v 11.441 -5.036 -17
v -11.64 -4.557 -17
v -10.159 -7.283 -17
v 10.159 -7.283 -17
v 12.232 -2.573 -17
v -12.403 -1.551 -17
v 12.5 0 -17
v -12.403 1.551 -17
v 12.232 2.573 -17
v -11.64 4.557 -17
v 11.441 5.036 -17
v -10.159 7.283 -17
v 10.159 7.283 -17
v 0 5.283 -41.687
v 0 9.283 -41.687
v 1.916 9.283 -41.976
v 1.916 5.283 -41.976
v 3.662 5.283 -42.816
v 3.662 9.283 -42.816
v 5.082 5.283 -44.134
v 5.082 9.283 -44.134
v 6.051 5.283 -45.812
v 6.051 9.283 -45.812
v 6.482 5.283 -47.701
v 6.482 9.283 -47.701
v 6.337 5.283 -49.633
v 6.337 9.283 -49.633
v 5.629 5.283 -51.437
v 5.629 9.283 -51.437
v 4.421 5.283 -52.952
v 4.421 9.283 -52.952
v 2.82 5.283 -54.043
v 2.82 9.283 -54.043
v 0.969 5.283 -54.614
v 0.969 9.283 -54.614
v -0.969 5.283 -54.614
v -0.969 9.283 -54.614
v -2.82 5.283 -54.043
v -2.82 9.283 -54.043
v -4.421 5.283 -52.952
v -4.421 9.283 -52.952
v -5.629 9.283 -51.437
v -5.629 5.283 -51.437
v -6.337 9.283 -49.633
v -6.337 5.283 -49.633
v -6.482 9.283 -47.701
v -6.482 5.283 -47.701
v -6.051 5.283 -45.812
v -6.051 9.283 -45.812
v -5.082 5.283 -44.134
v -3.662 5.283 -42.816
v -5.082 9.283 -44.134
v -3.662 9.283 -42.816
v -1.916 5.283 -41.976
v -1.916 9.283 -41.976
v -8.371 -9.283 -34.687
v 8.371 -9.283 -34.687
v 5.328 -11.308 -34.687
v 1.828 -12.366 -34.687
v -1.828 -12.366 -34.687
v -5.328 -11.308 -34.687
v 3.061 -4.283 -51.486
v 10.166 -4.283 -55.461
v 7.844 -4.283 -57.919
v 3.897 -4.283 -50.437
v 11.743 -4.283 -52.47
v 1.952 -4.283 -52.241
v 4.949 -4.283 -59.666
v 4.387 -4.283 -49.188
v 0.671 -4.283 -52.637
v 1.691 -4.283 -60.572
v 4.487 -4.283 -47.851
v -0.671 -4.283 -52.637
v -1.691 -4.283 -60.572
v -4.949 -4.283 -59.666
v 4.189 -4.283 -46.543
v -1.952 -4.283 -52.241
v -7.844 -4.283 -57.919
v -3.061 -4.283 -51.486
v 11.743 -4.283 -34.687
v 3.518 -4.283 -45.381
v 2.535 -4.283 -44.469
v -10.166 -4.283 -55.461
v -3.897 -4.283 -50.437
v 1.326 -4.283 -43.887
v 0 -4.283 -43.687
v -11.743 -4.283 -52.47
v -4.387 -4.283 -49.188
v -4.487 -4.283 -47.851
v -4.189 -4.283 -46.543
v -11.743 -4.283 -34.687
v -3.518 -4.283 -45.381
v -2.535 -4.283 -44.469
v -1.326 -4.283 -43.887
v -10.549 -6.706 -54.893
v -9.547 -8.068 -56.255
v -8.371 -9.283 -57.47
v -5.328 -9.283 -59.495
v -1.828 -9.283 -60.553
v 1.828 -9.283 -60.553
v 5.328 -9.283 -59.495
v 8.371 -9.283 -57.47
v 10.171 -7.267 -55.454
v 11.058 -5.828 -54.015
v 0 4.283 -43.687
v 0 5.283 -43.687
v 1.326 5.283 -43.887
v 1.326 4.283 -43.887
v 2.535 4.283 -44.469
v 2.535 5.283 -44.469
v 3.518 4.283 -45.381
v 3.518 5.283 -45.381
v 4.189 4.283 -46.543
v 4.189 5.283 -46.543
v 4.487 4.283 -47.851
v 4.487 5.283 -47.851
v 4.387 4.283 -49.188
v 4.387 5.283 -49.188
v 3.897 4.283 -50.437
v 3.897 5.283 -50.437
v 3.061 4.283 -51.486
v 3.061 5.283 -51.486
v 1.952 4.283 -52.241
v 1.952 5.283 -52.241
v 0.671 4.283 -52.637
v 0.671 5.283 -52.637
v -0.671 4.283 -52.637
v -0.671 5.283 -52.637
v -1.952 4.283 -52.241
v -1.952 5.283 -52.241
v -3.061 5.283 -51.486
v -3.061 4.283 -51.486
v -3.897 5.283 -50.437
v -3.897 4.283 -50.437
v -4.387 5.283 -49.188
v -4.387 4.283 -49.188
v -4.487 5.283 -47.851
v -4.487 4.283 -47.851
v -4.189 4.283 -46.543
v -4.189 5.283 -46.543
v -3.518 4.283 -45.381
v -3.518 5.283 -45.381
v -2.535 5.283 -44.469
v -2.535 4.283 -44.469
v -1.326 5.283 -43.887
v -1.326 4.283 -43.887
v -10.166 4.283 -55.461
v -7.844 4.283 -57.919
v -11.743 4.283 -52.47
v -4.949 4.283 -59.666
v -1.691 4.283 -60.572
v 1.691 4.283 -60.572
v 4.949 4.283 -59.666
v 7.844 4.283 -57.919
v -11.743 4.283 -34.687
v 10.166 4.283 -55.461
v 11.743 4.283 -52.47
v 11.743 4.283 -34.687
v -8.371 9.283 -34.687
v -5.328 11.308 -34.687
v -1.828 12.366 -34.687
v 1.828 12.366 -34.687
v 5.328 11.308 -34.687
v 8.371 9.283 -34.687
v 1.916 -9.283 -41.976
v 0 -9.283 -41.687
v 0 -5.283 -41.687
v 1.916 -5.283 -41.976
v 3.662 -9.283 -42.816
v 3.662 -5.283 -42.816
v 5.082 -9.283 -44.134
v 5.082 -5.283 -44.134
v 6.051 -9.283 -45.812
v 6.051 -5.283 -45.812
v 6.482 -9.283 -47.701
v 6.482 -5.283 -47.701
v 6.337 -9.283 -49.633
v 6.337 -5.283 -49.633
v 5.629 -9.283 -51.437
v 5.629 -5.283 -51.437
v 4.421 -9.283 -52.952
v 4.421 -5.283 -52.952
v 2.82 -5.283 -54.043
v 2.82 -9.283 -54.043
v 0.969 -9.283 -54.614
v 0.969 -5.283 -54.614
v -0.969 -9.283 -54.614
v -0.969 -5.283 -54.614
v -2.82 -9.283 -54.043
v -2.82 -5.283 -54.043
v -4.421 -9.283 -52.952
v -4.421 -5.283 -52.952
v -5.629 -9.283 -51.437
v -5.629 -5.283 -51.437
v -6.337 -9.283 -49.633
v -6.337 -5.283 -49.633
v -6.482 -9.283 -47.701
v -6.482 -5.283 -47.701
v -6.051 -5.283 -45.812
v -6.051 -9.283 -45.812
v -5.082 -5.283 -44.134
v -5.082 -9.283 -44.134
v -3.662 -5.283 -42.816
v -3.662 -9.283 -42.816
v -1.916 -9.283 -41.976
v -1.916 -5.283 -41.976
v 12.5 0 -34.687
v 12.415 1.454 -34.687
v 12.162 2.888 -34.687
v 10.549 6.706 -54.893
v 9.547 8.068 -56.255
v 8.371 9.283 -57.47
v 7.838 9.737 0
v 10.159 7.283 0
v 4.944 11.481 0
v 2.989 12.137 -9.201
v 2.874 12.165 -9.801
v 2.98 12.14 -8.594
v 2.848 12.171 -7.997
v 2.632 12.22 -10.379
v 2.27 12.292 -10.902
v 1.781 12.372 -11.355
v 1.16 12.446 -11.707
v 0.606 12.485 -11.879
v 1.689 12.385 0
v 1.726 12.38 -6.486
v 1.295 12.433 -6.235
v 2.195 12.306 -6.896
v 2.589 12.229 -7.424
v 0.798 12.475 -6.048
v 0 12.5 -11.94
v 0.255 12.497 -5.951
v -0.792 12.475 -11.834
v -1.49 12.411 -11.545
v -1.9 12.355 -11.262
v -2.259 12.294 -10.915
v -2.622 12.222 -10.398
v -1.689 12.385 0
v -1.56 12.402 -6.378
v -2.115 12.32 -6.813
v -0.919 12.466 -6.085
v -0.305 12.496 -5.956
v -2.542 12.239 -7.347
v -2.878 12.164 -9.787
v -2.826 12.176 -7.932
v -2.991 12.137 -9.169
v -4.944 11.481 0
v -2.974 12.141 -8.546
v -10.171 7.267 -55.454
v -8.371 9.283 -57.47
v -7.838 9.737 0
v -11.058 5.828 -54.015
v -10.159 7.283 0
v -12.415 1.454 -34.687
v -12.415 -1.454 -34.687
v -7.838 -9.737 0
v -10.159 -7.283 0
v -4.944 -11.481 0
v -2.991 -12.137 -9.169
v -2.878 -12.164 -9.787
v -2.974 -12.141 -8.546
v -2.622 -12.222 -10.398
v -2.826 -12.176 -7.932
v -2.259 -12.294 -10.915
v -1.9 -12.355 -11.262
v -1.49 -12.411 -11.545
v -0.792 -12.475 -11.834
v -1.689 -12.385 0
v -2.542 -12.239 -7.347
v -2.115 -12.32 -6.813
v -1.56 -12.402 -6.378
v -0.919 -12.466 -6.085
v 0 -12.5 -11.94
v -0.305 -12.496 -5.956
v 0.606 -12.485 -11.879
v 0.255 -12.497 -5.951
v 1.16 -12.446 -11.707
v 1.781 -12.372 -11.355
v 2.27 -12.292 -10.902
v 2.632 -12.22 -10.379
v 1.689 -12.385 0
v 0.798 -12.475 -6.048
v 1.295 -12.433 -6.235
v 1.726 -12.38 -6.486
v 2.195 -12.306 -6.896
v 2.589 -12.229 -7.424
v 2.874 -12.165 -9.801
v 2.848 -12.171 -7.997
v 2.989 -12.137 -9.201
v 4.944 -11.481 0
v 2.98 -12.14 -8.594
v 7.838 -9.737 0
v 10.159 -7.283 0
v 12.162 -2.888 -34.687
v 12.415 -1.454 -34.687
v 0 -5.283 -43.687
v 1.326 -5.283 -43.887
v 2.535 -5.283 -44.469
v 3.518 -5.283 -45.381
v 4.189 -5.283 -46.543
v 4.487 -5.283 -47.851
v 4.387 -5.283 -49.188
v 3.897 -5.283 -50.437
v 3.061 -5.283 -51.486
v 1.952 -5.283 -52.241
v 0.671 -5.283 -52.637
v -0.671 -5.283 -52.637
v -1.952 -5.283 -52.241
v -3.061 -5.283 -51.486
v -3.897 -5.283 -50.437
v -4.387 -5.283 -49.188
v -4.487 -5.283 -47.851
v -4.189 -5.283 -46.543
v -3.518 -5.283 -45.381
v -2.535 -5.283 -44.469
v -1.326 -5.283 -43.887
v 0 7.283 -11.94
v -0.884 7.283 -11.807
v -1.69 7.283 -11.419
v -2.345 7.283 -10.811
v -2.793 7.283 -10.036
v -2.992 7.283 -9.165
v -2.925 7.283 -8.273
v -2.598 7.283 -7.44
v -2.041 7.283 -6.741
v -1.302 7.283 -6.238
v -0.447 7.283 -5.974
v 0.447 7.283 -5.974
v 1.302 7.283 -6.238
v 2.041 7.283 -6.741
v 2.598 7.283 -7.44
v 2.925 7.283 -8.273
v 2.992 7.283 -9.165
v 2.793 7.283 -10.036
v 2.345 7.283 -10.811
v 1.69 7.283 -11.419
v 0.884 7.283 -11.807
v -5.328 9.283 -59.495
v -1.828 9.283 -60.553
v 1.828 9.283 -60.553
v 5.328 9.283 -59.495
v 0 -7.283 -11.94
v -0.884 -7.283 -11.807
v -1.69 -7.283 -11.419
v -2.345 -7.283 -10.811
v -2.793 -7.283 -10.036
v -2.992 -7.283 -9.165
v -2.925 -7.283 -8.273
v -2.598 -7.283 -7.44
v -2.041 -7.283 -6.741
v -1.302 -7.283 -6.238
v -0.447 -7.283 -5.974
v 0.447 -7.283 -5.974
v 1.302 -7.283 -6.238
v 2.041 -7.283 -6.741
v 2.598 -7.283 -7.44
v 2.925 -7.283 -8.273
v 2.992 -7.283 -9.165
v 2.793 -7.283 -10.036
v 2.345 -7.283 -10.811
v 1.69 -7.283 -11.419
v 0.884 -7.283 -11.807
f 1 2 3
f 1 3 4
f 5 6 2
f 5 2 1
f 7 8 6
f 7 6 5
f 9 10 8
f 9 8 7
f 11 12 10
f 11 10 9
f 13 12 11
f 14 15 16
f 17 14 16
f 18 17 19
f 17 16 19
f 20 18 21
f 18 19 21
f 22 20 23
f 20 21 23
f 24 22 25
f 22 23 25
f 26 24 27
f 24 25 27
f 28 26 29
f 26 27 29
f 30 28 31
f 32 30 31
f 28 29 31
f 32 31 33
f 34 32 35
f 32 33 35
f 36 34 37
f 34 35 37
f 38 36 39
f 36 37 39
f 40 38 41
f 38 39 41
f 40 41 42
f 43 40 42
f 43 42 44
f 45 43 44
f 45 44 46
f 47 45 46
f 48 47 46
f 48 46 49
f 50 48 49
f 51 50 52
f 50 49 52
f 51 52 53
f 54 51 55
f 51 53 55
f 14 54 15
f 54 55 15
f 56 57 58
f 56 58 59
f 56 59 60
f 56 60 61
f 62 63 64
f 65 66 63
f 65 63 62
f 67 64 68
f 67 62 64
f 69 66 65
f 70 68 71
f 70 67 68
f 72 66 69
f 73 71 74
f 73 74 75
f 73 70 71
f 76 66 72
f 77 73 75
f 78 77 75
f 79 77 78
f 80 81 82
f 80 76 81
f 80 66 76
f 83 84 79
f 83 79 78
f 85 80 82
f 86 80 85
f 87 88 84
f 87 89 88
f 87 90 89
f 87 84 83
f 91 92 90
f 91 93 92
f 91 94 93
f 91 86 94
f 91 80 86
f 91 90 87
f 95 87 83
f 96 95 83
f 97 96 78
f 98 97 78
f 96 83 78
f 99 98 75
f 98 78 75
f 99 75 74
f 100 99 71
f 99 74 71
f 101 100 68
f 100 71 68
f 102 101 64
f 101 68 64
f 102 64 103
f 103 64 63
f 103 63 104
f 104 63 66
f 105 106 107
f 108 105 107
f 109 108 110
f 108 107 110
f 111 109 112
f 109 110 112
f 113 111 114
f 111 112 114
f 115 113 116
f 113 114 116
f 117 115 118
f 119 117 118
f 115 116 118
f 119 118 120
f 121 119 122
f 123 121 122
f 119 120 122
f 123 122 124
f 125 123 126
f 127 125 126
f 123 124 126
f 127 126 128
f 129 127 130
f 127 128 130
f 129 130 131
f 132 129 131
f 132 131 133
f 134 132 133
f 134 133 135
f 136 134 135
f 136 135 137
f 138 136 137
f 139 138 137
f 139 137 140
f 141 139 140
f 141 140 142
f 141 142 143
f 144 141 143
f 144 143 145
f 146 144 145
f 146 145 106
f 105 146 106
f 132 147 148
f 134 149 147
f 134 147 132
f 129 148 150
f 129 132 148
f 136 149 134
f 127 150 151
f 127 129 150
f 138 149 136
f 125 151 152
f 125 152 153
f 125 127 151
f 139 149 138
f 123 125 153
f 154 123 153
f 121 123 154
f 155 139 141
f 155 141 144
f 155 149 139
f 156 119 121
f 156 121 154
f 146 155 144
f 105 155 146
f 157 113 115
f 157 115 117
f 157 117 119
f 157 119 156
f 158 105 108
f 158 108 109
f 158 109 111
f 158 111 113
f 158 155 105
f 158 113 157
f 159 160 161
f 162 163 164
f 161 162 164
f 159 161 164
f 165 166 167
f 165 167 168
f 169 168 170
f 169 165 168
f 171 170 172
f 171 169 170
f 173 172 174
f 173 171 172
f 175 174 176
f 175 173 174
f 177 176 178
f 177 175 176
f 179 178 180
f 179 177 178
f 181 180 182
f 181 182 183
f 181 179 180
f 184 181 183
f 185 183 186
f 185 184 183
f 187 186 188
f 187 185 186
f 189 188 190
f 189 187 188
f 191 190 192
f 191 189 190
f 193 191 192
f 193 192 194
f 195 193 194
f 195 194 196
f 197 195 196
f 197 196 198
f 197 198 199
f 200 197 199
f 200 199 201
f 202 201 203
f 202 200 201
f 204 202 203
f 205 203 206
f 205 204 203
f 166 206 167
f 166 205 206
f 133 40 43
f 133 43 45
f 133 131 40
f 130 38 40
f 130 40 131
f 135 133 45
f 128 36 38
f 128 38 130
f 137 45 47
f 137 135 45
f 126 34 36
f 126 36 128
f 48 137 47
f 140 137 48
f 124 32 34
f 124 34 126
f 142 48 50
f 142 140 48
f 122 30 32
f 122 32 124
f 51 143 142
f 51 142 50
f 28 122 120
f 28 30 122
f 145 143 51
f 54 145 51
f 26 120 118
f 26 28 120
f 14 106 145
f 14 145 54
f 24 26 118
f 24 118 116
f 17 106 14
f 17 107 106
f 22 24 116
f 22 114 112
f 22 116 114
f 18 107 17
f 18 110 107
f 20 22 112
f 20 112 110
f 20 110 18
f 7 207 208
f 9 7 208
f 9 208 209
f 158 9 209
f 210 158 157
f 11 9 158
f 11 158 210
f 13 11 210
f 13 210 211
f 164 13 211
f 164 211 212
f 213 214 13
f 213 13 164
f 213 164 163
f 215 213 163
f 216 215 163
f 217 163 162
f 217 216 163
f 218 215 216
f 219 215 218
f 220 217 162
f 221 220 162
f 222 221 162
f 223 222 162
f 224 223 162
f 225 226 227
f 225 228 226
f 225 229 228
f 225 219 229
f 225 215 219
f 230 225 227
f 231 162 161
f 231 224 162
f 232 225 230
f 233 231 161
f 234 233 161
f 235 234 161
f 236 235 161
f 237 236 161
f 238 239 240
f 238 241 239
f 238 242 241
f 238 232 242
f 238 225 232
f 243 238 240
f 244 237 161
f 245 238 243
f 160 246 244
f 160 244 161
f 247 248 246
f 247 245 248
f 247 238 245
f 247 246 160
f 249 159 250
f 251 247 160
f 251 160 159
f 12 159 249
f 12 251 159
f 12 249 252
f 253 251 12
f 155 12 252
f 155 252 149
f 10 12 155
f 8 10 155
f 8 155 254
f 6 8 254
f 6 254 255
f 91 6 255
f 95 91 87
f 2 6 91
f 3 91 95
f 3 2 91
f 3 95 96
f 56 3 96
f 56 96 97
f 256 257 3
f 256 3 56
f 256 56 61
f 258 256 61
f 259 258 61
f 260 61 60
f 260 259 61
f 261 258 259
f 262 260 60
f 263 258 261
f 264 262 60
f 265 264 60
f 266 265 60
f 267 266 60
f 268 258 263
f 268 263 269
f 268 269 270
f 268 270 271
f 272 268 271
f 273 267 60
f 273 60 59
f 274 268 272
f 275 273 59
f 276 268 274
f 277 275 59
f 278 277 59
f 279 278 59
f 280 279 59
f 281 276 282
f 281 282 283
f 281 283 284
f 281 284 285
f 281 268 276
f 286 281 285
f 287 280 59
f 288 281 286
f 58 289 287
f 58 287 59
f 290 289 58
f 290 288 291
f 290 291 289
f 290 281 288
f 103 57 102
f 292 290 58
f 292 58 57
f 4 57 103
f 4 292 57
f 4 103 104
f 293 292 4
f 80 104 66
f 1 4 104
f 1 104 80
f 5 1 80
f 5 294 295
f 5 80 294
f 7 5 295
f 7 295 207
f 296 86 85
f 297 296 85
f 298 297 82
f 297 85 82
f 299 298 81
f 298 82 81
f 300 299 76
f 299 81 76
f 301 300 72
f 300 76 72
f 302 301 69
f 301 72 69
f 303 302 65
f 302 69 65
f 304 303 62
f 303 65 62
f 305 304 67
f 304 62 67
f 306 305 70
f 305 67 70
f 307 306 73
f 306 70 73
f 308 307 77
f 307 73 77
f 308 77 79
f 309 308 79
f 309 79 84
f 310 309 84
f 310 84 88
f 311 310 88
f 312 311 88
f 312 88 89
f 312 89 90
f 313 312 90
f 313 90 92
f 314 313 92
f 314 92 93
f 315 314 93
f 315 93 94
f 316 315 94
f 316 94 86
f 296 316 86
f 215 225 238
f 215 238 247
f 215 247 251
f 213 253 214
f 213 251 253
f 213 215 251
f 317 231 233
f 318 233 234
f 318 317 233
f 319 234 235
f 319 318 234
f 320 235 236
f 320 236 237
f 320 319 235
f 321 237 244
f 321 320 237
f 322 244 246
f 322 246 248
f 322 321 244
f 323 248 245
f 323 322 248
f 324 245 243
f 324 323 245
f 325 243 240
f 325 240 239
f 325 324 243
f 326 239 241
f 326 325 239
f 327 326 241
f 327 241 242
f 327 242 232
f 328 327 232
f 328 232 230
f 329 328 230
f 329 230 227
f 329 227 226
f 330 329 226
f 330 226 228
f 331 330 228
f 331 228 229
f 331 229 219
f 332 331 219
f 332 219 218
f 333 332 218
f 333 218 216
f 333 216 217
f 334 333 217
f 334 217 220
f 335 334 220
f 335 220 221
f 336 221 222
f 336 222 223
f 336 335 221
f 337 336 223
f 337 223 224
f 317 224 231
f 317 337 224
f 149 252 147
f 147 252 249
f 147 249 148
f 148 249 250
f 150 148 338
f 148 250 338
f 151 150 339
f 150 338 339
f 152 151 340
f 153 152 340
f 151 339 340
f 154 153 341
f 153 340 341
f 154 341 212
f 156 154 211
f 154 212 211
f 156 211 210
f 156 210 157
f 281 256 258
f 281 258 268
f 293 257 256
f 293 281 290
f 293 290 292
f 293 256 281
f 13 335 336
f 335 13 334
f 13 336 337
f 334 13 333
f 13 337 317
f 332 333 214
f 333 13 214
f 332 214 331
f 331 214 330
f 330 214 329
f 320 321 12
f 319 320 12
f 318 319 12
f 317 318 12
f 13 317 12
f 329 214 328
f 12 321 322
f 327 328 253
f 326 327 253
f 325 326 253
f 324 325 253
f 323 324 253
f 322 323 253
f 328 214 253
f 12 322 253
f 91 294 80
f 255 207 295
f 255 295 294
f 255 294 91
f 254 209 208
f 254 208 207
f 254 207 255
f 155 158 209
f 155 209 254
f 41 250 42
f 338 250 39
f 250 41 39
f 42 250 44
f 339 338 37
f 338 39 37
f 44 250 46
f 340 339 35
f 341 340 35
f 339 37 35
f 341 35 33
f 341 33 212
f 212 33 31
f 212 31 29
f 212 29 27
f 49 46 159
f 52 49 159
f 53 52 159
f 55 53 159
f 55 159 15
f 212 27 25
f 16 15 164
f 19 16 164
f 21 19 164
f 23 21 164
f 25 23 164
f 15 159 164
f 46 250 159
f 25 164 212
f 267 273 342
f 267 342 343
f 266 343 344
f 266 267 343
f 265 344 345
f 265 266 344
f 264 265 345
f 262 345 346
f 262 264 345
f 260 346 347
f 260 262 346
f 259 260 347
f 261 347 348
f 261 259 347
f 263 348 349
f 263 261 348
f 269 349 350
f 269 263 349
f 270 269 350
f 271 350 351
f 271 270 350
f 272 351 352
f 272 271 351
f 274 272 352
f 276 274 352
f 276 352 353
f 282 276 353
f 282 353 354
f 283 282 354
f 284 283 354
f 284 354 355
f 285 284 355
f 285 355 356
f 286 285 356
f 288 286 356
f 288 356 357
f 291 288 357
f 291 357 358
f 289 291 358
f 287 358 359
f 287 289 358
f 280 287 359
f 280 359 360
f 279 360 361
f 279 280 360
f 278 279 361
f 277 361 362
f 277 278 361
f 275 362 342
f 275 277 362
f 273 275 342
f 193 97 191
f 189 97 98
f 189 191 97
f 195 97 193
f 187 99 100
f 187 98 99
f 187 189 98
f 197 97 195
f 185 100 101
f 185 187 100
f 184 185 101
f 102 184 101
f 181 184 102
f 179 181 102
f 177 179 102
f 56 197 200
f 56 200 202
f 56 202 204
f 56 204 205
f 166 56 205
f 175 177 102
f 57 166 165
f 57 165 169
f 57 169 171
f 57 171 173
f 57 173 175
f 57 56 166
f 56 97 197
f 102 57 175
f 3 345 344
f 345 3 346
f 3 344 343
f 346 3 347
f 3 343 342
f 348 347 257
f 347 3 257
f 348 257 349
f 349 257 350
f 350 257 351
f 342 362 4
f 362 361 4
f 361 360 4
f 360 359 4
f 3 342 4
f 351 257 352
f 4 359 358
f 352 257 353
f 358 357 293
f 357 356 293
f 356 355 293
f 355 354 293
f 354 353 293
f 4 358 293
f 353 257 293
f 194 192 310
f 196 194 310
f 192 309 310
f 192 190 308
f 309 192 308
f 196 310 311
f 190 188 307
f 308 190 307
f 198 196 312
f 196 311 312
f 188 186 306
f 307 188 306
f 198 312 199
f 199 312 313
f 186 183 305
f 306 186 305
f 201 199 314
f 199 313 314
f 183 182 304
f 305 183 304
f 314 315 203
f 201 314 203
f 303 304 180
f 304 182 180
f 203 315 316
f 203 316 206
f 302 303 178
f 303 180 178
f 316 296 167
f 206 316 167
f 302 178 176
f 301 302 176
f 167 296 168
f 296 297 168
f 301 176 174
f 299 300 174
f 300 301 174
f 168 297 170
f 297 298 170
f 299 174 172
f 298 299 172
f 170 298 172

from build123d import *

# Parameters (mm, degrees)
SKETCH_1_R               = 12.5
EXTRUDE_1_DEPTH          = 60.686921397
CUT_EXTRUDE_START        = -26
CUT_EXTRUDE_1_DEPTH      = 26
SKETCH_3_R               = 4.5
CUT_EXTRUDE_2_DEPTH      = 34.123937734
SKETCH_6_R               = 6.5
CUT_EXTRUDE_5_DEPTH      = 4
CUT_EXTRUDE_6_DEPTH      = 17
CUT_EXTRUDE_7_DEPTH      = 29
CUT_EXTRUDE_7_DEPTH_BACK = 17
SKETCH_9_R               = 3


with BuildPart() as part:
    # 스케치1 → 보스-돌출1 (new body)
    with BuildSketch(Plane.XY):
        Circle(SKETCH_1_R)
    extrude(amount=-EXTRUDE_1_DEPTH)

    # 스케치2 → 컷-돌출1 (cut)
    with BuildSketch(Plane(origin=(0, 0, -60.686921397), x_dir=(-1, 0, 0), z_dir=(0, 0, -1)).offset(CUT_EXTRUDE_START)):
        with BuildLine():
            Line((8.371418841, 9.282744561), (-8.371418841, 9.282744561))
            ThreePointArc((-8.371418841, 9.282744561), (0, 12.5), (8.371418841, 9.282744561))
        make_face()
        with BuildLine():
            Line((11.743427908, 4.282744561), (-11.743427908, 4.282744561))
            ThreePointArc((-11.743427908, 4.282744561), (-12.5, 0), (-11.743427908, -4.282744561))
            Line((-11.743427908, -4.282744561), (11.743427908, -4.282744561))
            ThreePointArc((11.743427908, -4.282744561), (12.5, 0), (11.743427908, 4.282744561))
        make_face()
        with BuildLine():
            Line((8.371418841, -9.282744561), (-8.371418841, -9.282744561))
            ThreePointArc((-8.371418841, -9.282744561), (0, -12.5), (8.371418841, -9.282744561))
        make_face()
    extrude(amount=CUT_EXTRUDE_1_DEPTH, mode=Mode.SUBTRACT)

    # 스케치3 → 컷-돌출2 (cut)
    with BuildSketch(Plane(origin=(0, 9.282744561, 0), x_dir=(1, 0, 0), z_dir=(0, 1, 0))):
        with Locations(Location((0, 48.186921397, 0), (0, 0, 270))):
            Circle(SKETCH_3_R)
        with BuildLine():
            Line((-22.5, 48.186921397), (-12.5, 48.186921397))
            ThreePointArc((-12.5, 48.186921397), (0, 60.686921397), (12.5, 48.186921397))
            Line((12.5, 48.186921397), (22.5, 48.186921397))
            ThreePointArc((22.5, 48.186921397), (0, 70.686921397), (-22.5, 48.186921397))
        make_face()
    extrude(amount=-CUT_EXTRUDE_2_DEPTH, mode=Mode.SUBTRACT)

    # 스케치6 → 컷-돌출5 (cut)
    with BuildSketch(Plane(origin=(0, 9.282744561, 0), x_dir=(1, 0, 0), z_dir=(0, 1, 0))):
        with Locations(Location((0, 48.186921397, 0), (0, 0, 270))):
            Circle(SKETCH_6_R)
    cut_extrude_5 = extrude(amount=-CUT_EXTRUDE_5_DEPTH, mode=Mode.SUBTRACT)

    # 대칭 복사3: 컷-돌출5 across plane
    add(cut_extrude_5.mirror(Plane.ZX), mode=Mode.SUBTRACT)

    # 스케치8 → 컷-돌출6 (cut)
    with BuildSketch(Plane.XY):
        with BuildLine():
            Line((10.159210883, 7.282886395), (-10.159210883, 7.282886395))
            ThreePointArc((-10.159210883, 7.282886395), (-12.5, 0), (-10.159210883, -7.282886395))
            Line((-10.159210883, -7.282886395), (10.159210883, -7.282886395))
            ThreePointArc((10.159210883, -7.282886395), (12.5, 0), (10.159210883, 7.282886395))
        make_face()
    extrude(amount=-CUT_EXTRUDE_6_DEPTH, mode=Mode.SUBTRACT)

    # 스케치9 → 컷-돌출7 (cut, two sides: drawn at the far end of the back side and taken through both)
    with BuildSketch(Plane(origin=(0, -7.282886395, 0), x_dir=(1, 0, 0), z_dir=(0, 1, 0)).offset(-CUT_EXTRUDE_7_DEPTH_BACK)):
        with Locations(Location((0, 8.940465454, 0), (0, 0, 90))):
            Circle(SKETCH_9_R)
    extrude(amount=CUT_EXTRUDE_7_DEPTH + CUT_EXTRUDE_7_DEPTH_BACK, mode=Mode.SUBTRACT)


solid = part.part
